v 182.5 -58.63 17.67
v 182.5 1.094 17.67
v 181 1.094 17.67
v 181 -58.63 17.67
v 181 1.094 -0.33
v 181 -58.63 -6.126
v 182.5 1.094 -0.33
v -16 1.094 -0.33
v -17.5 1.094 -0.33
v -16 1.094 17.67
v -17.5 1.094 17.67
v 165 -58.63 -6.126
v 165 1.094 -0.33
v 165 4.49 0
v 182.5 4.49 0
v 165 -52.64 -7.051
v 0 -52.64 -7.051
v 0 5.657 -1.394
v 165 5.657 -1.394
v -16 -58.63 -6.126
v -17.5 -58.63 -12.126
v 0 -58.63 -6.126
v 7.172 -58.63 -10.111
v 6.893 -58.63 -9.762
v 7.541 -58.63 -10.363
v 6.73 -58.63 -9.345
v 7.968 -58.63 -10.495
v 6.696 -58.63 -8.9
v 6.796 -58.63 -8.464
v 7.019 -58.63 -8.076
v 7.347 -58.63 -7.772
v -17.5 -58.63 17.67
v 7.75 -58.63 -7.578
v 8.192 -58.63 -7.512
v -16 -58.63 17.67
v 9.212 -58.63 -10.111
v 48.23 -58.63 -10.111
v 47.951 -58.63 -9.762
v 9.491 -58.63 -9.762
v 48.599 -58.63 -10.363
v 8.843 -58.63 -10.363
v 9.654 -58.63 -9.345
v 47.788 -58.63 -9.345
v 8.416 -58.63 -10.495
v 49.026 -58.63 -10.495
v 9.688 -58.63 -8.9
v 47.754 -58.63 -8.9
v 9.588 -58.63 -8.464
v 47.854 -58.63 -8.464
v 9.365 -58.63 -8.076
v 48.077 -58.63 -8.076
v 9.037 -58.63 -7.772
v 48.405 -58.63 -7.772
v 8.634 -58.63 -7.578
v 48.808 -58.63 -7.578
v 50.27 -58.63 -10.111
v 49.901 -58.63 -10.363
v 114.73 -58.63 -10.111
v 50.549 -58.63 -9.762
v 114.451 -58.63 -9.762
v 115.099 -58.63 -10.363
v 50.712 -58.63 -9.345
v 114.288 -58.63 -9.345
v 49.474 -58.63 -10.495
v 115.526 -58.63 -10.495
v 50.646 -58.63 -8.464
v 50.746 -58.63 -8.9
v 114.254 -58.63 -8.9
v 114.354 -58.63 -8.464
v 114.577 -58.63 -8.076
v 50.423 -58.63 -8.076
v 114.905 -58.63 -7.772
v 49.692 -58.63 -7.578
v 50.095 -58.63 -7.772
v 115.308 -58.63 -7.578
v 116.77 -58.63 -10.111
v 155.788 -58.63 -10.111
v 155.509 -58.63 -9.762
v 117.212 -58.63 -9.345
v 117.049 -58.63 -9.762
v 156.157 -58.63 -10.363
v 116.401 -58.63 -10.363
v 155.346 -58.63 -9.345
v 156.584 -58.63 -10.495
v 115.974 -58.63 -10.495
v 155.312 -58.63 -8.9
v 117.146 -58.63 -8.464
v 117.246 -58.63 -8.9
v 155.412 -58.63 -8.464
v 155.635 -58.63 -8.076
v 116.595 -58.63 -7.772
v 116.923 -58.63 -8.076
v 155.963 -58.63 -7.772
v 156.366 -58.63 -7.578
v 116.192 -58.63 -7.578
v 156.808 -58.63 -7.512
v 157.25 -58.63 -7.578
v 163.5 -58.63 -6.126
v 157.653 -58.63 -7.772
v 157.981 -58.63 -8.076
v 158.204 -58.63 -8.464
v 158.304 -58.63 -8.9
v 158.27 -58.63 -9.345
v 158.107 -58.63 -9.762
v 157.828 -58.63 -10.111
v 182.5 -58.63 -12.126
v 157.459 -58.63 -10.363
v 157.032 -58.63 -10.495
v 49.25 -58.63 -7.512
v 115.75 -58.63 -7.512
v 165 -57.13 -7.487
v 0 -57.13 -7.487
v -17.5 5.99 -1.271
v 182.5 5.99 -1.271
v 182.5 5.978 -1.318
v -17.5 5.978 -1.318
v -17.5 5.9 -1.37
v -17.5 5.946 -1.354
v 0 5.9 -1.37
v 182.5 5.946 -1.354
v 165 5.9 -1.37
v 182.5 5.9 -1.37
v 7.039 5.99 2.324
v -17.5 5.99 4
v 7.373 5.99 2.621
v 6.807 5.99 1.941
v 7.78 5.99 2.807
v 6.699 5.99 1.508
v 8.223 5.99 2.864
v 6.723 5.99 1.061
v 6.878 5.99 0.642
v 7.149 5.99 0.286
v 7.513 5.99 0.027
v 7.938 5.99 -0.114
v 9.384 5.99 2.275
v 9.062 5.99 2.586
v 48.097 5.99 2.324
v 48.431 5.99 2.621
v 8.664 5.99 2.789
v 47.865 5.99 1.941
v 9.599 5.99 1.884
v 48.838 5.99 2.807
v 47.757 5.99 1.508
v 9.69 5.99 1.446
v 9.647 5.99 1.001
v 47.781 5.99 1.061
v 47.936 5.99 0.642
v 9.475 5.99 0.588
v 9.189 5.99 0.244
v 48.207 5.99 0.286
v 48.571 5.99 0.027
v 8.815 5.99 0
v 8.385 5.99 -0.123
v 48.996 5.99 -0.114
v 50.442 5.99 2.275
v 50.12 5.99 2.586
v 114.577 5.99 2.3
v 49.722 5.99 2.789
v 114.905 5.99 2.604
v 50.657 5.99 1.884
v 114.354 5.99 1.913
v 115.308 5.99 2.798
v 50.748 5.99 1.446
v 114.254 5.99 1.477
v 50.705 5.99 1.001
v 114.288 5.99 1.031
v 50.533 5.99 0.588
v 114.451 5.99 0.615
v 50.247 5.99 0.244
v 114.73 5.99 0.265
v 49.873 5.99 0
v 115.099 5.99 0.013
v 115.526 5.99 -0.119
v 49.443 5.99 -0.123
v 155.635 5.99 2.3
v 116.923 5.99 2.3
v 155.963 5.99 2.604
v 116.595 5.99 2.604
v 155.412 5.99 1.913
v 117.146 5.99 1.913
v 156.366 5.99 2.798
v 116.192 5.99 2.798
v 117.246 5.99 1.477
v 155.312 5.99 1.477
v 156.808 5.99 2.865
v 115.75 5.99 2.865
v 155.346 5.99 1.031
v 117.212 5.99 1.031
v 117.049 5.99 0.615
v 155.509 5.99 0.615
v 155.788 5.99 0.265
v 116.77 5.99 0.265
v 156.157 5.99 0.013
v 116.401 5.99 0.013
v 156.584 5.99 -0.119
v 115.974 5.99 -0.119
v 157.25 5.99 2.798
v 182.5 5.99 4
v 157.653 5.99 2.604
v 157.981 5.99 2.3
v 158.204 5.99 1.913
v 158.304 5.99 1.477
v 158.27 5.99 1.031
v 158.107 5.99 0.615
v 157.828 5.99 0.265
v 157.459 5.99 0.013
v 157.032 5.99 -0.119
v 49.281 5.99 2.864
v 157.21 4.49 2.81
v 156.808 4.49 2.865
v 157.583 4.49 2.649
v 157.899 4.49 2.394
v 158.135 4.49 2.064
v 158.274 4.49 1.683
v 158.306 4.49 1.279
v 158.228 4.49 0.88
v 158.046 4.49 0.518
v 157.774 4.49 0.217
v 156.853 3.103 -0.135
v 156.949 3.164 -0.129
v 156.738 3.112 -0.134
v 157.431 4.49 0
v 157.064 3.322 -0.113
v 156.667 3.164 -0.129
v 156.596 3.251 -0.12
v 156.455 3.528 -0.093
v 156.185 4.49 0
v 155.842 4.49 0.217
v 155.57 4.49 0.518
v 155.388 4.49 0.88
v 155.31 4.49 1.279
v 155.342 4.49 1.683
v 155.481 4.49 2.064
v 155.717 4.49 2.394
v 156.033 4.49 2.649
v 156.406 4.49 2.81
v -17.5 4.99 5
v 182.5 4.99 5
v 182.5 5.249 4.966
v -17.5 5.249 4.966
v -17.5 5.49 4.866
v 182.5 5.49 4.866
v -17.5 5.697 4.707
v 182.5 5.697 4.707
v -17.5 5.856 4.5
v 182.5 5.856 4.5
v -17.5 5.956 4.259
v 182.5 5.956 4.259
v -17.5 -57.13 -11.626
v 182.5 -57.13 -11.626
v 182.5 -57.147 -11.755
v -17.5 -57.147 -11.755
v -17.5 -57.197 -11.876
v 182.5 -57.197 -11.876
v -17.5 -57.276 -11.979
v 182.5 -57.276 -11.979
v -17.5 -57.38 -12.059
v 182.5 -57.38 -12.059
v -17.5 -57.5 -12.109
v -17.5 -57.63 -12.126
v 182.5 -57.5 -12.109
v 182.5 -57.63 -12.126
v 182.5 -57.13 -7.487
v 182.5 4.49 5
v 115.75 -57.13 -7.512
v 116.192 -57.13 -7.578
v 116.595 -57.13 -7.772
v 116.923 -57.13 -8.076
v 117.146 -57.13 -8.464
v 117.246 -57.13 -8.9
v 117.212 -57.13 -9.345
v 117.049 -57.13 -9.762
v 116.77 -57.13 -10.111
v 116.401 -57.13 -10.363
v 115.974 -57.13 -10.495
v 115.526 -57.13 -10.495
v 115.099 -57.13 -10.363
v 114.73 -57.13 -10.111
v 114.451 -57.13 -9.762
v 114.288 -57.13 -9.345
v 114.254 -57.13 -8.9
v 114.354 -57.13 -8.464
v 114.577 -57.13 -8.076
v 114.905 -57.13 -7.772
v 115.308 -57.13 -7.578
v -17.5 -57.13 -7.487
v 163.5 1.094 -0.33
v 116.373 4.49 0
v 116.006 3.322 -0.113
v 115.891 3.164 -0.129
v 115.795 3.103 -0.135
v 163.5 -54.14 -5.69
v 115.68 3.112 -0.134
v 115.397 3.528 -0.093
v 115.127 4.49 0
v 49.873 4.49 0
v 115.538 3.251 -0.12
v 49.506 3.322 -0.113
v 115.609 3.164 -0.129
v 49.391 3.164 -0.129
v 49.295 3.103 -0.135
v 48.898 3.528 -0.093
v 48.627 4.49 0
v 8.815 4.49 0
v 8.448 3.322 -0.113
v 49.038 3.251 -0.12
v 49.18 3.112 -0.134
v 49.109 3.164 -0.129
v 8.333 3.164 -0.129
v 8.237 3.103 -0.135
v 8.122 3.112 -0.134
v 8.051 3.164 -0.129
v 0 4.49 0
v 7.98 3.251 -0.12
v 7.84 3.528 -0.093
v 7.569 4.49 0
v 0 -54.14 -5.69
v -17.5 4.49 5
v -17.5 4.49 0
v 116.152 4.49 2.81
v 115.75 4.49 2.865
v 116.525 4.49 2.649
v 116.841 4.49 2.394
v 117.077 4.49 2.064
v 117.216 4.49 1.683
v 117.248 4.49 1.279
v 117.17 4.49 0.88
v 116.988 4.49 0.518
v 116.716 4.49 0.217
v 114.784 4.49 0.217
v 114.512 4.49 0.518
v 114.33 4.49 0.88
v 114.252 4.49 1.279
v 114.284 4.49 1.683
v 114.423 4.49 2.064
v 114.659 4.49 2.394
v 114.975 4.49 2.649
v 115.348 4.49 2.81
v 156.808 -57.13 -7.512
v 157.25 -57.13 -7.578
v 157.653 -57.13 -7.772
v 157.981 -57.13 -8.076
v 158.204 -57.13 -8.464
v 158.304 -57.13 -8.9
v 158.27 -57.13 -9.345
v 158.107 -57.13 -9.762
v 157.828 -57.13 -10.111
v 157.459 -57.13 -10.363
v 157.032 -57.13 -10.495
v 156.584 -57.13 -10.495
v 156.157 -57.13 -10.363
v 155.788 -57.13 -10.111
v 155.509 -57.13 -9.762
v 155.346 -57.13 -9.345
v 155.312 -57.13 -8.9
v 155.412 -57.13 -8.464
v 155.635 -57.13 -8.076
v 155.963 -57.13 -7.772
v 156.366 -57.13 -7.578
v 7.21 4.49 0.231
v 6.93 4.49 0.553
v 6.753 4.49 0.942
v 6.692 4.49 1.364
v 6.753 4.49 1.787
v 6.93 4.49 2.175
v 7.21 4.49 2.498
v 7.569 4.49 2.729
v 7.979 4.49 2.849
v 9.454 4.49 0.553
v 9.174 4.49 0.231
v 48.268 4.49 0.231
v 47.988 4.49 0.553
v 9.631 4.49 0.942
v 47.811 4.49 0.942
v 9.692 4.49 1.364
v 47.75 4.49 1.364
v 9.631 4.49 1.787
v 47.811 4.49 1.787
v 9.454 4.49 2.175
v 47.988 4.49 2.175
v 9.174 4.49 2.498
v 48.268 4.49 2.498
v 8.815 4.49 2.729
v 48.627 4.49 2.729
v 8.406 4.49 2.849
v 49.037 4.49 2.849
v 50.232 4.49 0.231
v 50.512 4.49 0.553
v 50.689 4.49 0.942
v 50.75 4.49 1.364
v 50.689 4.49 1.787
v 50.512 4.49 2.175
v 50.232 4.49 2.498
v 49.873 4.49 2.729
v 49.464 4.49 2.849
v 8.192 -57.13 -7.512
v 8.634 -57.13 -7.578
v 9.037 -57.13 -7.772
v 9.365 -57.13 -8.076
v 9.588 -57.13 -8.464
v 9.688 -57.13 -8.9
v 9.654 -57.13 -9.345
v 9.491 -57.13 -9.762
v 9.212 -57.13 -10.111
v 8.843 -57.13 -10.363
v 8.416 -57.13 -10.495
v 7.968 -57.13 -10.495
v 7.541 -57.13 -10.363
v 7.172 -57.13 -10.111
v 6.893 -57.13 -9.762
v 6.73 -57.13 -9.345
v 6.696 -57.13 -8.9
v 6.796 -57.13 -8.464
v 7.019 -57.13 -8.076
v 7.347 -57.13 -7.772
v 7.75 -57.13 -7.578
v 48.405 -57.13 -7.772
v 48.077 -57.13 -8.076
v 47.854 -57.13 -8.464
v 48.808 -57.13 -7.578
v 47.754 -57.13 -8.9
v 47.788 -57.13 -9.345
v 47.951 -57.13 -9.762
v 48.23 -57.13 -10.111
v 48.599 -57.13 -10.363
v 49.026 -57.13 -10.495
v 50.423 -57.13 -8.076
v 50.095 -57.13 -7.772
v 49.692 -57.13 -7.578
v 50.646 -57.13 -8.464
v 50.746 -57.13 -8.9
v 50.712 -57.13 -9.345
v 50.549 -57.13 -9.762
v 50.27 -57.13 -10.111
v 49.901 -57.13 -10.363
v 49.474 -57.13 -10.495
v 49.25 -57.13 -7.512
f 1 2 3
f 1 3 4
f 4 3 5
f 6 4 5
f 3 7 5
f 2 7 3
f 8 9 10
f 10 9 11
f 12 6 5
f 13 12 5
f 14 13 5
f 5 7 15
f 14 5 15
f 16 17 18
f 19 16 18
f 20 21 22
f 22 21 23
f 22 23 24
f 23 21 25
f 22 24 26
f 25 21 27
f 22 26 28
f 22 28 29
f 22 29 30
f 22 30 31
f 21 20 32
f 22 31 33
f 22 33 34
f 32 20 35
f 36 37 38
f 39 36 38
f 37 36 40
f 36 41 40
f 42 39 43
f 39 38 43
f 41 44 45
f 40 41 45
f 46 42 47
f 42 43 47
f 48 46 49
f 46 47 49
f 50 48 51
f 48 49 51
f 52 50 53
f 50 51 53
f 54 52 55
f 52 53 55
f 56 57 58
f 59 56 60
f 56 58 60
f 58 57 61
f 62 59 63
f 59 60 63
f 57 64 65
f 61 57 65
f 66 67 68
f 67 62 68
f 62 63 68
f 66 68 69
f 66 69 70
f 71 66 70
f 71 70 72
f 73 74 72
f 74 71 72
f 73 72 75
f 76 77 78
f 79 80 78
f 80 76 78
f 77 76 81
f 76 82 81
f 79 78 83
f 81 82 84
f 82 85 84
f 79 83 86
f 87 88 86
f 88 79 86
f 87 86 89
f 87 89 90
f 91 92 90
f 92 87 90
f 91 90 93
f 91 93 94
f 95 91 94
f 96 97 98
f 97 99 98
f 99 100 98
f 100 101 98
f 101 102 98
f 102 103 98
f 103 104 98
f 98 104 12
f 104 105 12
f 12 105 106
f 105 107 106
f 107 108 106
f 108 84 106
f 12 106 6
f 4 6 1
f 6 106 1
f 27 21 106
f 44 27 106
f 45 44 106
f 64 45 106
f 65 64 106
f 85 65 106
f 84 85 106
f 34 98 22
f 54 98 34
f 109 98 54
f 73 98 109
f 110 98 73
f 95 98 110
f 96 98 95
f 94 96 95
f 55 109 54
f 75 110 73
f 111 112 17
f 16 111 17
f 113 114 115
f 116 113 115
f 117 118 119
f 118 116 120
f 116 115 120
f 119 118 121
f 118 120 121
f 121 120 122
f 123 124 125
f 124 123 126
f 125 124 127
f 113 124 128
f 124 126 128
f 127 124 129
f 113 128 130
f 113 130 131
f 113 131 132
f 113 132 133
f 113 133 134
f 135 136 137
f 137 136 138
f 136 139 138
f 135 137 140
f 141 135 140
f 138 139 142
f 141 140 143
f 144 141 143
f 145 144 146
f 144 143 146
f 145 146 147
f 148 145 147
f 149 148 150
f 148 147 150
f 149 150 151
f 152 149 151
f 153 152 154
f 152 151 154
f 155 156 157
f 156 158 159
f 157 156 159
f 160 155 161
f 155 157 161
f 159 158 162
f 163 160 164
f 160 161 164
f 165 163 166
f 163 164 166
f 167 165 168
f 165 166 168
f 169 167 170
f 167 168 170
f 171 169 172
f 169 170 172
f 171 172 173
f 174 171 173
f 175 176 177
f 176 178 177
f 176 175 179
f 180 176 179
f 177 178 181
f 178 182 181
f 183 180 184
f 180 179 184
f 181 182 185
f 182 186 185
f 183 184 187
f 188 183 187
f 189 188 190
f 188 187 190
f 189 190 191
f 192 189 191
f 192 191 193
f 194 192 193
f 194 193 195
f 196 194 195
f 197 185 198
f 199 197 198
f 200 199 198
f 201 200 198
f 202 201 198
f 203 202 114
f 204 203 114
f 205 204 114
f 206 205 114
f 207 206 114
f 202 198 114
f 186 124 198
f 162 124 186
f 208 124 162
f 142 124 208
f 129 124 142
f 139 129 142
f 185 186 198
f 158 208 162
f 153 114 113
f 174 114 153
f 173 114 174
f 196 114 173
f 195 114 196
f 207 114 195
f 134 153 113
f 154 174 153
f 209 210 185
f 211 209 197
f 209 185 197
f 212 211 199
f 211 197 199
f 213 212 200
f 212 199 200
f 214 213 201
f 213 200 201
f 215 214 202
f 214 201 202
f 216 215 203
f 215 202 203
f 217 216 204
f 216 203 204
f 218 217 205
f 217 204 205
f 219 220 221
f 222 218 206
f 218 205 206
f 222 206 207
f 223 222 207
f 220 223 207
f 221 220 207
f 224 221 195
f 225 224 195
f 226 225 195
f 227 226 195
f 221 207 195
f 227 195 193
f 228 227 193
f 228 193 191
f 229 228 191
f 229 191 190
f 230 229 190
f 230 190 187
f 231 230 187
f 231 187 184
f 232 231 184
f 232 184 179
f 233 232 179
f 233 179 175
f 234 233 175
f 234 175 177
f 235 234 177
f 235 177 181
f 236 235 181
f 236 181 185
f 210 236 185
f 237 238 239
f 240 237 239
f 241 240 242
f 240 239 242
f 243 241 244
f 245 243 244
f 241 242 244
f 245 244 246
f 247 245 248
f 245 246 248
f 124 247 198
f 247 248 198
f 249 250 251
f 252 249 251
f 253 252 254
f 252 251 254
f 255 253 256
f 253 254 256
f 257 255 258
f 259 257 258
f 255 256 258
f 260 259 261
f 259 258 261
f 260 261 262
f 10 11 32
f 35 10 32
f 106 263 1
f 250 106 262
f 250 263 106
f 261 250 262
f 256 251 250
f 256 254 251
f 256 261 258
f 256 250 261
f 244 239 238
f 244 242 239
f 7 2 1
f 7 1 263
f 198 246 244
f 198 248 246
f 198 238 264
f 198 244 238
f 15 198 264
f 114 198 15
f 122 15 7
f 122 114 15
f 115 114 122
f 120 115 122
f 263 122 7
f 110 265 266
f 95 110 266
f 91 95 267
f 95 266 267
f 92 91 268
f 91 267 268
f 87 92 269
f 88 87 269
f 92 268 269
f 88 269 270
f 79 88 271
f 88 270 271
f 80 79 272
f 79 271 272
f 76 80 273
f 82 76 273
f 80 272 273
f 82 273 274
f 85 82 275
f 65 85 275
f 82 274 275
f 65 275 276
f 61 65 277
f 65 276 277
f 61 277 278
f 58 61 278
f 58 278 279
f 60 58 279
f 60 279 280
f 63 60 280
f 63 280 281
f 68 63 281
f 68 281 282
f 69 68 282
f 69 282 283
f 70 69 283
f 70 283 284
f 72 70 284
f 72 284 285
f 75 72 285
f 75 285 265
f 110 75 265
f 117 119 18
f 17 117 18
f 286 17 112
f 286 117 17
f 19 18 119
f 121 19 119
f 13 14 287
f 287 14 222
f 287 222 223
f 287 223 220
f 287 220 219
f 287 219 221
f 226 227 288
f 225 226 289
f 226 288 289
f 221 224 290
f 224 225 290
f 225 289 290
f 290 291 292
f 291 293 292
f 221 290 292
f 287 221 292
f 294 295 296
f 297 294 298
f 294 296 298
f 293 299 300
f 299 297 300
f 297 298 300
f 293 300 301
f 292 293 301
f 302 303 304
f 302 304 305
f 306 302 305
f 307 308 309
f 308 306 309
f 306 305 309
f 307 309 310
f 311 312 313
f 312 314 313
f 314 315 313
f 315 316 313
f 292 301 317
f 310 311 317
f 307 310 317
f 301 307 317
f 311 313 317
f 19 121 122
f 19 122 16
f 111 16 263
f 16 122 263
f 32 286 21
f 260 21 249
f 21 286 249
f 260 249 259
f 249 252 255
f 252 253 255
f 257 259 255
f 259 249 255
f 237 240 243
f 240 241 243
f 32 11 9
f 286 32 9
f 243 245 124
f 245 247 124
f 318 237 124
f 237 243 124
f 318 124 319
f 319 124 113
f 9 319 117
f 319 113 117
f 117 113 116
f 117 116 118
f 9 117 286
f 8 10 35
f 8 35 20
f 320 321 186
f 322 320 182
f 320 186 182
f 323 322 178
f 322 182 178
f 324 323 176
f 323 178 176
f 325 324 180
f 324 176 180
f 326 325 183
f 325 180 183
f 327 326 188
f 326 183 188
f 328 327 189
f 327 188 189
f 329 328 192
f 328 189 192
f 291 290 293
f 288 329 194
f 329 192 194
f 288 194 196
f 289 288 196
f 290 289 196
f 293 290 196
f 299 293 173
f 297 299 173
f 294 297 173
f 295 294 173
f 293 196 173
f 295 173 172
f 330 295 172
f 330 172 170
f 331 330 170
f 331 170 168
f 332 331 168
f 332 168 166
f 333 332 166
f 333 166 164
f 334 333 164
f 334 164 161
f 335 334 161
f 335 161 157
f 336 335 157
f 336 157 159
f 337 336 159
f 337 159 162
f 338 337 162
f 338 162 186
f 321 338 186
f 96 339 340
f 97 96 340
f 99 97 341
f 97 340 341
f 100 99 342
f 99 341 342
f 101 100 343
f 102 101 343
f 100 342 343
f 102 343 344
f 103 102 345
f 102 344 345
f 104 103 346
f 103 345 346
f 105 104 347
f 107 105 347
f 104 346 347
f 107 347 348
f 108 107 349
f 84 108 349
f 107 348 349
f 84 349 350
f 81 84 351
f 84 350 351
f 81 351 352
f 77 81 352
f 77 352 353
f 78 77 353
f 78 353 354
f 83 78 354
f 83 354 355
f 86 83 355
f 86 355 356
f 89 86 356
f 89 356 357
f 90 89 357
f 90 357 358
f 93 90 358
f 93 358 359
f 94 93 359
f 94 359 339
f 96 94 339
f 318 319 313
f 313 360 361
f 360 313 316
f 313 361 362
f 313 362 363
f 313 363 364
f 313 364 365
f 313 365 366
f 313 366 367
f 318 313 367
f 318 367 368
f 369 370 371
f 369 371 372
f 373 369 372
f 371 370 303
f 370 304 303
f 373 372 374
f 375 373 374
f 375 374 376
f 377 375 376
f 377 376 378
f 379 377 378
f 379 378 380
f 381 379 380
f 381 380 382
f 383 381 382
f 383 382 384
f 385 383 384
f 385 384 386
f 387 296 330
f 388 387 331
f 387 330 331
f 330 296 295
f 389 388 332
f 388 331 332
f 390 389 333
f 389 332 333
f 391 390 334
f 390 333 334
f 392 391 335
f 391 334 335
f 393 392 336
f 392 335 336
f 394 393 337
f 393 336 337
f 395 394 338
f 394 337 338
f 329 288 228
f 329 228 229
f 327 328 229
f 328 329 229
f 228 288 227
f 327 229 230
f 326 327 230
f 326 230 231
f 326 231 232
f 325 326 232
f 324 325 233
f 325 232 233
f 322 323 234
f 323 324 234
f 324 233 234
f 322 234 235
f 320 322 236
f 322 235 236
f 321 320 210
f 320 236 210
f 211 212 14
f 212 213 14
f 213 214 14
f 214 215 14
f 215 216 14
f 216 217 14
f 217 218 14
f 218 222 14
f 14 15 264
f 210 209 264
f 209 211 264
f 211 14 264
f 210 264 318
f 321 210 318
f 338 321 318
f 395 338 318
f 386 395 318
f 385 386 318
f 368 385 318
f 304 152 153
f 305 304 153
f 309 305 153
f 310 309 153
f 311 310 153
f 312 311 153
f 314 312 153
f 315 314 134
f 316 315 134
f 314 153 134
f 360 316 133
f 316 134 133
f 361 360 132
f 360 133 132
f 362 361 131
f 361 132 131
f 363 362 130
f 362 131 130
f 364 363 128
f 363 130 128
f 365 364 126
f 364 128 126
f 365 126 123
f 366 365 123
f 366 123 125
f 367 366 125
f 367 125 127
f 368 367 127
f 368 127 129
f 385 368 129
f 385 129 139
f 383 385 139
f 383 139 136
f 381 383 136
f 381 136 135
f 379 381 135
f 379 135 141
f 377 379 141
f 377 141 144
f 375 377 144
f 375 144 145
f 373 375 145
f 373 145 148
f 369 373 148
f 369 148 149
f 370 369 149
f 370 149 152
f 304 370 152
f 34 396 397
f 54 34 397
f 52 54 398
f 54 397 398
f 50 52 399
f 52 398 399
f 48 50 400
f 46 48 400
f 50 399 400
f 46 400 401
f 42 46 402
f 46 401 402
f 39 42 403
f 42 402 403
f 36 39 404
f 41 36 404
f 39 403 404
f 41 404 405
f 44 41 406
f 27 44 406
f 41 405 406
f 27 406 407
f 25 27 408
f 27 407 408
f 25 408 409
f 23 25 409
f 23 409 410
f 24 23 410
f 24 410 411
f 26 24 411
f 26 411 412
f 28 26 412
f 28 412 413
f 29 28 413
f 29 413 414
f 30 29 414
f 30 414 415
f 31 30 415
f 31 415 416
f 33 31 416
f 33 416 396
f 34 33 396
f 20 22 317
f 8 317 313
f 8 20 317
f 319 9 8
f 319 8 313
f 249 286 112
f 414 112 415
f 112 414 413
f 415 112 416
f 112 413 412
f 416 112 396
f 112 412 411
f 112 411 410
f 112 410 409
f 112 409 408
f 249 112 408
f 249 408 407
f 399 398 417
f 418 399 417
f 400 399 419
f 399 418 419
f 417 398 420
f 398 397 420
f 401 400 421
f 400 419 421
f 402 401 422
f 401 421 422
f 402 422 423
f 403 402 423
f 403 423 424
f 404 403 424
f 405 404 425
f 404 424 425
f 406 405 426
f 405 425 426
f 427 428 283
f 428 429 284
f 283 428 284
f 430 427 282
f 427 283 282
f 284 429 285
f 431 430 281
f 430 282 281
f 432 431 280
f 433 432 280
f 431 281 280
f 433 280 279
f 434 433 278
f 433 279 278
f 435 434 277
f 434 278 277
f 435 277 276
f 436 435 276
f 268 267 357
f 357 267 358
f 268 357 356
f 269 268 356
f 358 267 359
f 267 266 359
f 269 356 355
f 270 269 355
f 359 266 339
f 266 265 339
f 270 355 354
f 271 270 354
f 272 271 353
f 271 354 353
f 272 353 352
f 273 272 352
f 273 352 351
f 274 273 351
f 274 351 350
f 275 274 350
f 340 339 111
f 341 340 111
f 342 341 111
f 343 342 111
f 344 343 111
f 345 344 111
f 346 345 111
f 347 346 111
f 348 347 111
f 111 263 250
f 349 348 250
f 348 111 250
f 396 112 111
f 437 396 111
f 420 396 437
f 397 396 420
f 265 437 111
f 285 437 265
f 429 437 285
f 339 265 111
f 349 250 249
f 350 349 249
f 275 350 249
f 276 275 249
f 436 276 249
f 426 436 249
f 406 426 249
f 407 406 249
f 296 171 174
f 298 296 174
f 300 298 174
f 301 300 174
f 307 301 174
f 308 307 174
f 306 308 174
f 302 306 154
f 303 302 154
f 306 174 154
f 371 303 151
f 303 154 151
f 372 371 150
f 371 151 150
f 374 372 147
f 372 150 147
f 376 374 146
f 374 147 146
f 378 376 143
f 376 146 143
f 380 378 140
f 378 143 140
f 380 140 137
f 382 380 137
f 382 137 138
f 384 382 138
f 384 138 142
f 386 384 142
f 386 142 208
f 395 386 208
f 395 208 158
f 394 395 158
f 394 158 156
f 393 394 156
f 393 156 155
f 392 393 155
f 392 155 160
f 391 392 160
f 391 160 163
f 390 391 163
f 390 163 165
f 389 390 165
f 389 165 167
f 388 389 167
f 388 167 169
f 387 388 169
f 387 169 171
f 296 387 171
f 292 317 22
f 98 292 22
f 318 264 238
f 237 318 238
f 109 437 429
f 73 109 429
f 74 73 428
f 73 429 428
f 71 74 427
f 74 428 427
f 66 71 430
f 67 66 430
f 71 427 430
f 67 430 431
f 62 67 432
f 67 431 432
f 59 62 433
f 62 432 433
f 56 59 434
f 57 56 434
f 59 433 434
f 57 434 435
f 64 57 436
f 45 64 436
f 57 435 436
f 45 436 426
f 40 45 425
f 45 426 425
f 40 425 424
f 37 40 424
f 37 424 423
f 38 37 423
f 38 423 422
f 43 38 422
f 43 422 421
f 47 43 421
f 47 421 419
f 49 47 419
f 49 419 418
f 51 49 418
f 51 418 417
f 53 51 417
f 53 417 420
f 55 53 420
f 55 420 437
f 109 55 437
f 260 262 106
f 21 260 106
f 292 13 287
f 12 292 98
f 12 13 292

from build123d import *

# Parameters (mm, degrees)
EXTRUDE_1_DEPTH     = 165
SKETCH_2_R          = 1.5
CUT_EXTRUDE_2_DEPTH = 66
EXTRUDE_2_DEPTH     = 1.5
EXTRUDE_START       = 17.5
EXTRUDE_3_DEPTH     = 17.5
EXTRUDE_4_DEPTH     = 1.5
CUT_EXTRUDE_3_DEPTH = 1.5


with BuildPart() as part:
    # 草图1 → 凸台-拉伸1 (new body)
    with BuildSketch(Plane(origin=(0, 0, 0), x_dir=(0, 0, -1), z_dir=(1, 0, 0))):
        with BuildLine():
            Line((0, 4.49026118), (5.69, -54.13973882))
            Line((5.69, -54.13973882), (6.125751322, -58.62973882))
            Line((6.125751322, -58.62973882), (12.125751322, -58.62973882))
            Line((12.125751322, -58.62973882), (12.125751322, -57.62973882))
            ThreePointArc((12.125751322, -57.62973882), (11.979304712, -57.27618543), (11.625751322, -57.12973882))
            Line((11.625751322, -57.12973882), (7.487224752, -57.12973882))
            Line((7.487224752, -57.12973882), (7.05147343, -52.63973882))
            Line((7.05147343, -52.63973882), (1.393781374, 5.657358767))
            Line((1.393781374, 5.657358767), (1.370240908, 5.899920726))
            ThreePointArc((1.370240908, 5.899920726), (1.337917334, 5.964308309), (1.270708535, 5.99026118))
            Line((1.270708535, 5.99026118), (-4, 5.99026118))
            ThreePointArc((-4, 5.99026118), (-4.707106781, 5.697367961), (-5, 4.99026118))
            Line((-5, 4.99026118), (-5, 4.49026118))
            Line((-5, 4.49026118), (0, 4.49026118))
        make_face()
    extrude(amount=EXTRUDE_1_DEPTH)

    # 草图2 → 切除-拉伸2 (cut)
    with BuildSketch(Plane(origin=(0, 5.99026118, 0), x_dir=(1, 0, 0), z_dir=(0, 1, 0))):
        with Locations(Location((156.807985478, -1.364645732, 0), (0, 0, 270))):
            Circle(SKETCH_2_R)
        with Locations(Location((115.749974851, -1.364645732, 0), (0, 0, 270))):
            Circle(SKETCH_2_R)
        with Locations(Location((49.250025149, -1.364645732, 0), (0, 0, 65.47273381))):
            Circle(SKETCH_2_R)
        with Locations(Location((8.192014522, -1.364645732, 0), (0, 0, 65.47273381))):
            Circle(SKETCH_2_R)
        with Locations(Location((8.192014522, 9.011696347, 0), (0, 0, 270))):
            Circle(SKETCH_2_R)
        with Locations(Location((156.807985478, 9.011696347, 0), (0, 0, 270))):
            Circle(SKETCH_2_R)
        with Locations(Location((115.749974851, 9.011696347, 0), (0, 0, 270))):
            Circle(SKETCH_2_R)
        with Locations(Location((49.250025149, 9.011696347, 0), (0, 0, 270))):
            Circle(SKETCH_2_R)
    extrude(amount=-CUT_EXTRUDE_2_DEPTH, mode=Mode.SUBTRACT)

    # 草图3 → 凸台-拉伸2 (add)
    with BuildSketch(Plane(origin=(165, 0, 0), x_dir=(0, 0, -1), z_dir=(1, 0, 0))):
        Polygon((0.32961608, 1.093883189), (-17.67038392, 1.093883189), (-17.67038392, -58.62973882), (6.125751322, -58.62973882), align=None)
    extrude(amount=-EXTRUDE_2_DEPTH)

    # 草图5 → 凸台-拉伸3 (add)
    with BuildSketch(Plane.ZY.offset(EXTRUDE_START)):
        with BuildLine():
            Line((4, 5.99026118), (-1.270708535, 5.99026118))
            ThreePointArc((-1.270708535, 5.99026118), (-1.337917334, 5.964308309), (-1.370240908, 5.899920726))
            Line((-1.370240908, 5.899920726), (-7.487224752, -57.12973882))
            Line((-7.487224752, -57.12973882), (-11.625751322, -57.12973882))
            ThreePointArc((-11.625751322, -57.12973882), (-11.979304712, -57.27618543), (-12.125751322, -57.62973882))
            Line((-12.125751322, -57.62973882), (-12.125751322, -58.62973882))
            Line((-12.125751322, -58.62973882), (-6.125751322, -58.62973882))
            Line((-6.125751322, -58.62973882), (0, 4.49026118))
            Line((0, 4.49026118), (5, 4.49026118))
            Line((5, 4.49026118), (5, 4.99026118))
            ThreePointArc((5, 4.99026118), (4.707106781, 5.697367961), (4, 5.99026118))
        make_face()
    extrude_3 = extrude(amount=-EXTRUDE_3_DEPTH)

    # 镜向2: 凸台-拉伸3 across plane
    add(extrude_3.mirror(Plane(origin=(82.5, 0, 0), x_dir=(0, 0, 1), z_dir=(1, 0, 0))))

    # 草图6 → 凸台-拉伸4 (add)
    with BuildSketch(Plane(origin=(182.5, 0, 0), x_dir=(0, 0, -1), z_dir=(1, 0, 0))):
        Polygon((0.32961608, 1.093883189), (-17.67038392, 1.093883189), (-17.67038392, -58.62973882), (6.125751322, -58.62973882), align=None)
    extrude_4 = extrude(amount=-EXTRUDE_4_DEPTH)

    # 草图7 → 切除-拉伸3 (cut)
    with BuildSketch(Plane(origin=(165, 0, 0), x_dir=(0, 0, -1), z_dir=(1, 0, 0))):
        Polygon((0.32961608, 1.093883189), (6.382938613, -61.279807515), (-18.871026255, -61.279807515), (-18.871026255, 1.093883189), align=None)
    extrude(amount=-CUT_EXTRUDE_3_DEPTH, mode=Mode.SUBTRACT)

    # 镜向4: 凸台-拉伸4 across plane
    add(extrude_4.mirror(Plane(origin=(82.5, 0, 0), x_dir=(0, 0, 1), z_dir=(1, 0, 0))))


solid = part.part
